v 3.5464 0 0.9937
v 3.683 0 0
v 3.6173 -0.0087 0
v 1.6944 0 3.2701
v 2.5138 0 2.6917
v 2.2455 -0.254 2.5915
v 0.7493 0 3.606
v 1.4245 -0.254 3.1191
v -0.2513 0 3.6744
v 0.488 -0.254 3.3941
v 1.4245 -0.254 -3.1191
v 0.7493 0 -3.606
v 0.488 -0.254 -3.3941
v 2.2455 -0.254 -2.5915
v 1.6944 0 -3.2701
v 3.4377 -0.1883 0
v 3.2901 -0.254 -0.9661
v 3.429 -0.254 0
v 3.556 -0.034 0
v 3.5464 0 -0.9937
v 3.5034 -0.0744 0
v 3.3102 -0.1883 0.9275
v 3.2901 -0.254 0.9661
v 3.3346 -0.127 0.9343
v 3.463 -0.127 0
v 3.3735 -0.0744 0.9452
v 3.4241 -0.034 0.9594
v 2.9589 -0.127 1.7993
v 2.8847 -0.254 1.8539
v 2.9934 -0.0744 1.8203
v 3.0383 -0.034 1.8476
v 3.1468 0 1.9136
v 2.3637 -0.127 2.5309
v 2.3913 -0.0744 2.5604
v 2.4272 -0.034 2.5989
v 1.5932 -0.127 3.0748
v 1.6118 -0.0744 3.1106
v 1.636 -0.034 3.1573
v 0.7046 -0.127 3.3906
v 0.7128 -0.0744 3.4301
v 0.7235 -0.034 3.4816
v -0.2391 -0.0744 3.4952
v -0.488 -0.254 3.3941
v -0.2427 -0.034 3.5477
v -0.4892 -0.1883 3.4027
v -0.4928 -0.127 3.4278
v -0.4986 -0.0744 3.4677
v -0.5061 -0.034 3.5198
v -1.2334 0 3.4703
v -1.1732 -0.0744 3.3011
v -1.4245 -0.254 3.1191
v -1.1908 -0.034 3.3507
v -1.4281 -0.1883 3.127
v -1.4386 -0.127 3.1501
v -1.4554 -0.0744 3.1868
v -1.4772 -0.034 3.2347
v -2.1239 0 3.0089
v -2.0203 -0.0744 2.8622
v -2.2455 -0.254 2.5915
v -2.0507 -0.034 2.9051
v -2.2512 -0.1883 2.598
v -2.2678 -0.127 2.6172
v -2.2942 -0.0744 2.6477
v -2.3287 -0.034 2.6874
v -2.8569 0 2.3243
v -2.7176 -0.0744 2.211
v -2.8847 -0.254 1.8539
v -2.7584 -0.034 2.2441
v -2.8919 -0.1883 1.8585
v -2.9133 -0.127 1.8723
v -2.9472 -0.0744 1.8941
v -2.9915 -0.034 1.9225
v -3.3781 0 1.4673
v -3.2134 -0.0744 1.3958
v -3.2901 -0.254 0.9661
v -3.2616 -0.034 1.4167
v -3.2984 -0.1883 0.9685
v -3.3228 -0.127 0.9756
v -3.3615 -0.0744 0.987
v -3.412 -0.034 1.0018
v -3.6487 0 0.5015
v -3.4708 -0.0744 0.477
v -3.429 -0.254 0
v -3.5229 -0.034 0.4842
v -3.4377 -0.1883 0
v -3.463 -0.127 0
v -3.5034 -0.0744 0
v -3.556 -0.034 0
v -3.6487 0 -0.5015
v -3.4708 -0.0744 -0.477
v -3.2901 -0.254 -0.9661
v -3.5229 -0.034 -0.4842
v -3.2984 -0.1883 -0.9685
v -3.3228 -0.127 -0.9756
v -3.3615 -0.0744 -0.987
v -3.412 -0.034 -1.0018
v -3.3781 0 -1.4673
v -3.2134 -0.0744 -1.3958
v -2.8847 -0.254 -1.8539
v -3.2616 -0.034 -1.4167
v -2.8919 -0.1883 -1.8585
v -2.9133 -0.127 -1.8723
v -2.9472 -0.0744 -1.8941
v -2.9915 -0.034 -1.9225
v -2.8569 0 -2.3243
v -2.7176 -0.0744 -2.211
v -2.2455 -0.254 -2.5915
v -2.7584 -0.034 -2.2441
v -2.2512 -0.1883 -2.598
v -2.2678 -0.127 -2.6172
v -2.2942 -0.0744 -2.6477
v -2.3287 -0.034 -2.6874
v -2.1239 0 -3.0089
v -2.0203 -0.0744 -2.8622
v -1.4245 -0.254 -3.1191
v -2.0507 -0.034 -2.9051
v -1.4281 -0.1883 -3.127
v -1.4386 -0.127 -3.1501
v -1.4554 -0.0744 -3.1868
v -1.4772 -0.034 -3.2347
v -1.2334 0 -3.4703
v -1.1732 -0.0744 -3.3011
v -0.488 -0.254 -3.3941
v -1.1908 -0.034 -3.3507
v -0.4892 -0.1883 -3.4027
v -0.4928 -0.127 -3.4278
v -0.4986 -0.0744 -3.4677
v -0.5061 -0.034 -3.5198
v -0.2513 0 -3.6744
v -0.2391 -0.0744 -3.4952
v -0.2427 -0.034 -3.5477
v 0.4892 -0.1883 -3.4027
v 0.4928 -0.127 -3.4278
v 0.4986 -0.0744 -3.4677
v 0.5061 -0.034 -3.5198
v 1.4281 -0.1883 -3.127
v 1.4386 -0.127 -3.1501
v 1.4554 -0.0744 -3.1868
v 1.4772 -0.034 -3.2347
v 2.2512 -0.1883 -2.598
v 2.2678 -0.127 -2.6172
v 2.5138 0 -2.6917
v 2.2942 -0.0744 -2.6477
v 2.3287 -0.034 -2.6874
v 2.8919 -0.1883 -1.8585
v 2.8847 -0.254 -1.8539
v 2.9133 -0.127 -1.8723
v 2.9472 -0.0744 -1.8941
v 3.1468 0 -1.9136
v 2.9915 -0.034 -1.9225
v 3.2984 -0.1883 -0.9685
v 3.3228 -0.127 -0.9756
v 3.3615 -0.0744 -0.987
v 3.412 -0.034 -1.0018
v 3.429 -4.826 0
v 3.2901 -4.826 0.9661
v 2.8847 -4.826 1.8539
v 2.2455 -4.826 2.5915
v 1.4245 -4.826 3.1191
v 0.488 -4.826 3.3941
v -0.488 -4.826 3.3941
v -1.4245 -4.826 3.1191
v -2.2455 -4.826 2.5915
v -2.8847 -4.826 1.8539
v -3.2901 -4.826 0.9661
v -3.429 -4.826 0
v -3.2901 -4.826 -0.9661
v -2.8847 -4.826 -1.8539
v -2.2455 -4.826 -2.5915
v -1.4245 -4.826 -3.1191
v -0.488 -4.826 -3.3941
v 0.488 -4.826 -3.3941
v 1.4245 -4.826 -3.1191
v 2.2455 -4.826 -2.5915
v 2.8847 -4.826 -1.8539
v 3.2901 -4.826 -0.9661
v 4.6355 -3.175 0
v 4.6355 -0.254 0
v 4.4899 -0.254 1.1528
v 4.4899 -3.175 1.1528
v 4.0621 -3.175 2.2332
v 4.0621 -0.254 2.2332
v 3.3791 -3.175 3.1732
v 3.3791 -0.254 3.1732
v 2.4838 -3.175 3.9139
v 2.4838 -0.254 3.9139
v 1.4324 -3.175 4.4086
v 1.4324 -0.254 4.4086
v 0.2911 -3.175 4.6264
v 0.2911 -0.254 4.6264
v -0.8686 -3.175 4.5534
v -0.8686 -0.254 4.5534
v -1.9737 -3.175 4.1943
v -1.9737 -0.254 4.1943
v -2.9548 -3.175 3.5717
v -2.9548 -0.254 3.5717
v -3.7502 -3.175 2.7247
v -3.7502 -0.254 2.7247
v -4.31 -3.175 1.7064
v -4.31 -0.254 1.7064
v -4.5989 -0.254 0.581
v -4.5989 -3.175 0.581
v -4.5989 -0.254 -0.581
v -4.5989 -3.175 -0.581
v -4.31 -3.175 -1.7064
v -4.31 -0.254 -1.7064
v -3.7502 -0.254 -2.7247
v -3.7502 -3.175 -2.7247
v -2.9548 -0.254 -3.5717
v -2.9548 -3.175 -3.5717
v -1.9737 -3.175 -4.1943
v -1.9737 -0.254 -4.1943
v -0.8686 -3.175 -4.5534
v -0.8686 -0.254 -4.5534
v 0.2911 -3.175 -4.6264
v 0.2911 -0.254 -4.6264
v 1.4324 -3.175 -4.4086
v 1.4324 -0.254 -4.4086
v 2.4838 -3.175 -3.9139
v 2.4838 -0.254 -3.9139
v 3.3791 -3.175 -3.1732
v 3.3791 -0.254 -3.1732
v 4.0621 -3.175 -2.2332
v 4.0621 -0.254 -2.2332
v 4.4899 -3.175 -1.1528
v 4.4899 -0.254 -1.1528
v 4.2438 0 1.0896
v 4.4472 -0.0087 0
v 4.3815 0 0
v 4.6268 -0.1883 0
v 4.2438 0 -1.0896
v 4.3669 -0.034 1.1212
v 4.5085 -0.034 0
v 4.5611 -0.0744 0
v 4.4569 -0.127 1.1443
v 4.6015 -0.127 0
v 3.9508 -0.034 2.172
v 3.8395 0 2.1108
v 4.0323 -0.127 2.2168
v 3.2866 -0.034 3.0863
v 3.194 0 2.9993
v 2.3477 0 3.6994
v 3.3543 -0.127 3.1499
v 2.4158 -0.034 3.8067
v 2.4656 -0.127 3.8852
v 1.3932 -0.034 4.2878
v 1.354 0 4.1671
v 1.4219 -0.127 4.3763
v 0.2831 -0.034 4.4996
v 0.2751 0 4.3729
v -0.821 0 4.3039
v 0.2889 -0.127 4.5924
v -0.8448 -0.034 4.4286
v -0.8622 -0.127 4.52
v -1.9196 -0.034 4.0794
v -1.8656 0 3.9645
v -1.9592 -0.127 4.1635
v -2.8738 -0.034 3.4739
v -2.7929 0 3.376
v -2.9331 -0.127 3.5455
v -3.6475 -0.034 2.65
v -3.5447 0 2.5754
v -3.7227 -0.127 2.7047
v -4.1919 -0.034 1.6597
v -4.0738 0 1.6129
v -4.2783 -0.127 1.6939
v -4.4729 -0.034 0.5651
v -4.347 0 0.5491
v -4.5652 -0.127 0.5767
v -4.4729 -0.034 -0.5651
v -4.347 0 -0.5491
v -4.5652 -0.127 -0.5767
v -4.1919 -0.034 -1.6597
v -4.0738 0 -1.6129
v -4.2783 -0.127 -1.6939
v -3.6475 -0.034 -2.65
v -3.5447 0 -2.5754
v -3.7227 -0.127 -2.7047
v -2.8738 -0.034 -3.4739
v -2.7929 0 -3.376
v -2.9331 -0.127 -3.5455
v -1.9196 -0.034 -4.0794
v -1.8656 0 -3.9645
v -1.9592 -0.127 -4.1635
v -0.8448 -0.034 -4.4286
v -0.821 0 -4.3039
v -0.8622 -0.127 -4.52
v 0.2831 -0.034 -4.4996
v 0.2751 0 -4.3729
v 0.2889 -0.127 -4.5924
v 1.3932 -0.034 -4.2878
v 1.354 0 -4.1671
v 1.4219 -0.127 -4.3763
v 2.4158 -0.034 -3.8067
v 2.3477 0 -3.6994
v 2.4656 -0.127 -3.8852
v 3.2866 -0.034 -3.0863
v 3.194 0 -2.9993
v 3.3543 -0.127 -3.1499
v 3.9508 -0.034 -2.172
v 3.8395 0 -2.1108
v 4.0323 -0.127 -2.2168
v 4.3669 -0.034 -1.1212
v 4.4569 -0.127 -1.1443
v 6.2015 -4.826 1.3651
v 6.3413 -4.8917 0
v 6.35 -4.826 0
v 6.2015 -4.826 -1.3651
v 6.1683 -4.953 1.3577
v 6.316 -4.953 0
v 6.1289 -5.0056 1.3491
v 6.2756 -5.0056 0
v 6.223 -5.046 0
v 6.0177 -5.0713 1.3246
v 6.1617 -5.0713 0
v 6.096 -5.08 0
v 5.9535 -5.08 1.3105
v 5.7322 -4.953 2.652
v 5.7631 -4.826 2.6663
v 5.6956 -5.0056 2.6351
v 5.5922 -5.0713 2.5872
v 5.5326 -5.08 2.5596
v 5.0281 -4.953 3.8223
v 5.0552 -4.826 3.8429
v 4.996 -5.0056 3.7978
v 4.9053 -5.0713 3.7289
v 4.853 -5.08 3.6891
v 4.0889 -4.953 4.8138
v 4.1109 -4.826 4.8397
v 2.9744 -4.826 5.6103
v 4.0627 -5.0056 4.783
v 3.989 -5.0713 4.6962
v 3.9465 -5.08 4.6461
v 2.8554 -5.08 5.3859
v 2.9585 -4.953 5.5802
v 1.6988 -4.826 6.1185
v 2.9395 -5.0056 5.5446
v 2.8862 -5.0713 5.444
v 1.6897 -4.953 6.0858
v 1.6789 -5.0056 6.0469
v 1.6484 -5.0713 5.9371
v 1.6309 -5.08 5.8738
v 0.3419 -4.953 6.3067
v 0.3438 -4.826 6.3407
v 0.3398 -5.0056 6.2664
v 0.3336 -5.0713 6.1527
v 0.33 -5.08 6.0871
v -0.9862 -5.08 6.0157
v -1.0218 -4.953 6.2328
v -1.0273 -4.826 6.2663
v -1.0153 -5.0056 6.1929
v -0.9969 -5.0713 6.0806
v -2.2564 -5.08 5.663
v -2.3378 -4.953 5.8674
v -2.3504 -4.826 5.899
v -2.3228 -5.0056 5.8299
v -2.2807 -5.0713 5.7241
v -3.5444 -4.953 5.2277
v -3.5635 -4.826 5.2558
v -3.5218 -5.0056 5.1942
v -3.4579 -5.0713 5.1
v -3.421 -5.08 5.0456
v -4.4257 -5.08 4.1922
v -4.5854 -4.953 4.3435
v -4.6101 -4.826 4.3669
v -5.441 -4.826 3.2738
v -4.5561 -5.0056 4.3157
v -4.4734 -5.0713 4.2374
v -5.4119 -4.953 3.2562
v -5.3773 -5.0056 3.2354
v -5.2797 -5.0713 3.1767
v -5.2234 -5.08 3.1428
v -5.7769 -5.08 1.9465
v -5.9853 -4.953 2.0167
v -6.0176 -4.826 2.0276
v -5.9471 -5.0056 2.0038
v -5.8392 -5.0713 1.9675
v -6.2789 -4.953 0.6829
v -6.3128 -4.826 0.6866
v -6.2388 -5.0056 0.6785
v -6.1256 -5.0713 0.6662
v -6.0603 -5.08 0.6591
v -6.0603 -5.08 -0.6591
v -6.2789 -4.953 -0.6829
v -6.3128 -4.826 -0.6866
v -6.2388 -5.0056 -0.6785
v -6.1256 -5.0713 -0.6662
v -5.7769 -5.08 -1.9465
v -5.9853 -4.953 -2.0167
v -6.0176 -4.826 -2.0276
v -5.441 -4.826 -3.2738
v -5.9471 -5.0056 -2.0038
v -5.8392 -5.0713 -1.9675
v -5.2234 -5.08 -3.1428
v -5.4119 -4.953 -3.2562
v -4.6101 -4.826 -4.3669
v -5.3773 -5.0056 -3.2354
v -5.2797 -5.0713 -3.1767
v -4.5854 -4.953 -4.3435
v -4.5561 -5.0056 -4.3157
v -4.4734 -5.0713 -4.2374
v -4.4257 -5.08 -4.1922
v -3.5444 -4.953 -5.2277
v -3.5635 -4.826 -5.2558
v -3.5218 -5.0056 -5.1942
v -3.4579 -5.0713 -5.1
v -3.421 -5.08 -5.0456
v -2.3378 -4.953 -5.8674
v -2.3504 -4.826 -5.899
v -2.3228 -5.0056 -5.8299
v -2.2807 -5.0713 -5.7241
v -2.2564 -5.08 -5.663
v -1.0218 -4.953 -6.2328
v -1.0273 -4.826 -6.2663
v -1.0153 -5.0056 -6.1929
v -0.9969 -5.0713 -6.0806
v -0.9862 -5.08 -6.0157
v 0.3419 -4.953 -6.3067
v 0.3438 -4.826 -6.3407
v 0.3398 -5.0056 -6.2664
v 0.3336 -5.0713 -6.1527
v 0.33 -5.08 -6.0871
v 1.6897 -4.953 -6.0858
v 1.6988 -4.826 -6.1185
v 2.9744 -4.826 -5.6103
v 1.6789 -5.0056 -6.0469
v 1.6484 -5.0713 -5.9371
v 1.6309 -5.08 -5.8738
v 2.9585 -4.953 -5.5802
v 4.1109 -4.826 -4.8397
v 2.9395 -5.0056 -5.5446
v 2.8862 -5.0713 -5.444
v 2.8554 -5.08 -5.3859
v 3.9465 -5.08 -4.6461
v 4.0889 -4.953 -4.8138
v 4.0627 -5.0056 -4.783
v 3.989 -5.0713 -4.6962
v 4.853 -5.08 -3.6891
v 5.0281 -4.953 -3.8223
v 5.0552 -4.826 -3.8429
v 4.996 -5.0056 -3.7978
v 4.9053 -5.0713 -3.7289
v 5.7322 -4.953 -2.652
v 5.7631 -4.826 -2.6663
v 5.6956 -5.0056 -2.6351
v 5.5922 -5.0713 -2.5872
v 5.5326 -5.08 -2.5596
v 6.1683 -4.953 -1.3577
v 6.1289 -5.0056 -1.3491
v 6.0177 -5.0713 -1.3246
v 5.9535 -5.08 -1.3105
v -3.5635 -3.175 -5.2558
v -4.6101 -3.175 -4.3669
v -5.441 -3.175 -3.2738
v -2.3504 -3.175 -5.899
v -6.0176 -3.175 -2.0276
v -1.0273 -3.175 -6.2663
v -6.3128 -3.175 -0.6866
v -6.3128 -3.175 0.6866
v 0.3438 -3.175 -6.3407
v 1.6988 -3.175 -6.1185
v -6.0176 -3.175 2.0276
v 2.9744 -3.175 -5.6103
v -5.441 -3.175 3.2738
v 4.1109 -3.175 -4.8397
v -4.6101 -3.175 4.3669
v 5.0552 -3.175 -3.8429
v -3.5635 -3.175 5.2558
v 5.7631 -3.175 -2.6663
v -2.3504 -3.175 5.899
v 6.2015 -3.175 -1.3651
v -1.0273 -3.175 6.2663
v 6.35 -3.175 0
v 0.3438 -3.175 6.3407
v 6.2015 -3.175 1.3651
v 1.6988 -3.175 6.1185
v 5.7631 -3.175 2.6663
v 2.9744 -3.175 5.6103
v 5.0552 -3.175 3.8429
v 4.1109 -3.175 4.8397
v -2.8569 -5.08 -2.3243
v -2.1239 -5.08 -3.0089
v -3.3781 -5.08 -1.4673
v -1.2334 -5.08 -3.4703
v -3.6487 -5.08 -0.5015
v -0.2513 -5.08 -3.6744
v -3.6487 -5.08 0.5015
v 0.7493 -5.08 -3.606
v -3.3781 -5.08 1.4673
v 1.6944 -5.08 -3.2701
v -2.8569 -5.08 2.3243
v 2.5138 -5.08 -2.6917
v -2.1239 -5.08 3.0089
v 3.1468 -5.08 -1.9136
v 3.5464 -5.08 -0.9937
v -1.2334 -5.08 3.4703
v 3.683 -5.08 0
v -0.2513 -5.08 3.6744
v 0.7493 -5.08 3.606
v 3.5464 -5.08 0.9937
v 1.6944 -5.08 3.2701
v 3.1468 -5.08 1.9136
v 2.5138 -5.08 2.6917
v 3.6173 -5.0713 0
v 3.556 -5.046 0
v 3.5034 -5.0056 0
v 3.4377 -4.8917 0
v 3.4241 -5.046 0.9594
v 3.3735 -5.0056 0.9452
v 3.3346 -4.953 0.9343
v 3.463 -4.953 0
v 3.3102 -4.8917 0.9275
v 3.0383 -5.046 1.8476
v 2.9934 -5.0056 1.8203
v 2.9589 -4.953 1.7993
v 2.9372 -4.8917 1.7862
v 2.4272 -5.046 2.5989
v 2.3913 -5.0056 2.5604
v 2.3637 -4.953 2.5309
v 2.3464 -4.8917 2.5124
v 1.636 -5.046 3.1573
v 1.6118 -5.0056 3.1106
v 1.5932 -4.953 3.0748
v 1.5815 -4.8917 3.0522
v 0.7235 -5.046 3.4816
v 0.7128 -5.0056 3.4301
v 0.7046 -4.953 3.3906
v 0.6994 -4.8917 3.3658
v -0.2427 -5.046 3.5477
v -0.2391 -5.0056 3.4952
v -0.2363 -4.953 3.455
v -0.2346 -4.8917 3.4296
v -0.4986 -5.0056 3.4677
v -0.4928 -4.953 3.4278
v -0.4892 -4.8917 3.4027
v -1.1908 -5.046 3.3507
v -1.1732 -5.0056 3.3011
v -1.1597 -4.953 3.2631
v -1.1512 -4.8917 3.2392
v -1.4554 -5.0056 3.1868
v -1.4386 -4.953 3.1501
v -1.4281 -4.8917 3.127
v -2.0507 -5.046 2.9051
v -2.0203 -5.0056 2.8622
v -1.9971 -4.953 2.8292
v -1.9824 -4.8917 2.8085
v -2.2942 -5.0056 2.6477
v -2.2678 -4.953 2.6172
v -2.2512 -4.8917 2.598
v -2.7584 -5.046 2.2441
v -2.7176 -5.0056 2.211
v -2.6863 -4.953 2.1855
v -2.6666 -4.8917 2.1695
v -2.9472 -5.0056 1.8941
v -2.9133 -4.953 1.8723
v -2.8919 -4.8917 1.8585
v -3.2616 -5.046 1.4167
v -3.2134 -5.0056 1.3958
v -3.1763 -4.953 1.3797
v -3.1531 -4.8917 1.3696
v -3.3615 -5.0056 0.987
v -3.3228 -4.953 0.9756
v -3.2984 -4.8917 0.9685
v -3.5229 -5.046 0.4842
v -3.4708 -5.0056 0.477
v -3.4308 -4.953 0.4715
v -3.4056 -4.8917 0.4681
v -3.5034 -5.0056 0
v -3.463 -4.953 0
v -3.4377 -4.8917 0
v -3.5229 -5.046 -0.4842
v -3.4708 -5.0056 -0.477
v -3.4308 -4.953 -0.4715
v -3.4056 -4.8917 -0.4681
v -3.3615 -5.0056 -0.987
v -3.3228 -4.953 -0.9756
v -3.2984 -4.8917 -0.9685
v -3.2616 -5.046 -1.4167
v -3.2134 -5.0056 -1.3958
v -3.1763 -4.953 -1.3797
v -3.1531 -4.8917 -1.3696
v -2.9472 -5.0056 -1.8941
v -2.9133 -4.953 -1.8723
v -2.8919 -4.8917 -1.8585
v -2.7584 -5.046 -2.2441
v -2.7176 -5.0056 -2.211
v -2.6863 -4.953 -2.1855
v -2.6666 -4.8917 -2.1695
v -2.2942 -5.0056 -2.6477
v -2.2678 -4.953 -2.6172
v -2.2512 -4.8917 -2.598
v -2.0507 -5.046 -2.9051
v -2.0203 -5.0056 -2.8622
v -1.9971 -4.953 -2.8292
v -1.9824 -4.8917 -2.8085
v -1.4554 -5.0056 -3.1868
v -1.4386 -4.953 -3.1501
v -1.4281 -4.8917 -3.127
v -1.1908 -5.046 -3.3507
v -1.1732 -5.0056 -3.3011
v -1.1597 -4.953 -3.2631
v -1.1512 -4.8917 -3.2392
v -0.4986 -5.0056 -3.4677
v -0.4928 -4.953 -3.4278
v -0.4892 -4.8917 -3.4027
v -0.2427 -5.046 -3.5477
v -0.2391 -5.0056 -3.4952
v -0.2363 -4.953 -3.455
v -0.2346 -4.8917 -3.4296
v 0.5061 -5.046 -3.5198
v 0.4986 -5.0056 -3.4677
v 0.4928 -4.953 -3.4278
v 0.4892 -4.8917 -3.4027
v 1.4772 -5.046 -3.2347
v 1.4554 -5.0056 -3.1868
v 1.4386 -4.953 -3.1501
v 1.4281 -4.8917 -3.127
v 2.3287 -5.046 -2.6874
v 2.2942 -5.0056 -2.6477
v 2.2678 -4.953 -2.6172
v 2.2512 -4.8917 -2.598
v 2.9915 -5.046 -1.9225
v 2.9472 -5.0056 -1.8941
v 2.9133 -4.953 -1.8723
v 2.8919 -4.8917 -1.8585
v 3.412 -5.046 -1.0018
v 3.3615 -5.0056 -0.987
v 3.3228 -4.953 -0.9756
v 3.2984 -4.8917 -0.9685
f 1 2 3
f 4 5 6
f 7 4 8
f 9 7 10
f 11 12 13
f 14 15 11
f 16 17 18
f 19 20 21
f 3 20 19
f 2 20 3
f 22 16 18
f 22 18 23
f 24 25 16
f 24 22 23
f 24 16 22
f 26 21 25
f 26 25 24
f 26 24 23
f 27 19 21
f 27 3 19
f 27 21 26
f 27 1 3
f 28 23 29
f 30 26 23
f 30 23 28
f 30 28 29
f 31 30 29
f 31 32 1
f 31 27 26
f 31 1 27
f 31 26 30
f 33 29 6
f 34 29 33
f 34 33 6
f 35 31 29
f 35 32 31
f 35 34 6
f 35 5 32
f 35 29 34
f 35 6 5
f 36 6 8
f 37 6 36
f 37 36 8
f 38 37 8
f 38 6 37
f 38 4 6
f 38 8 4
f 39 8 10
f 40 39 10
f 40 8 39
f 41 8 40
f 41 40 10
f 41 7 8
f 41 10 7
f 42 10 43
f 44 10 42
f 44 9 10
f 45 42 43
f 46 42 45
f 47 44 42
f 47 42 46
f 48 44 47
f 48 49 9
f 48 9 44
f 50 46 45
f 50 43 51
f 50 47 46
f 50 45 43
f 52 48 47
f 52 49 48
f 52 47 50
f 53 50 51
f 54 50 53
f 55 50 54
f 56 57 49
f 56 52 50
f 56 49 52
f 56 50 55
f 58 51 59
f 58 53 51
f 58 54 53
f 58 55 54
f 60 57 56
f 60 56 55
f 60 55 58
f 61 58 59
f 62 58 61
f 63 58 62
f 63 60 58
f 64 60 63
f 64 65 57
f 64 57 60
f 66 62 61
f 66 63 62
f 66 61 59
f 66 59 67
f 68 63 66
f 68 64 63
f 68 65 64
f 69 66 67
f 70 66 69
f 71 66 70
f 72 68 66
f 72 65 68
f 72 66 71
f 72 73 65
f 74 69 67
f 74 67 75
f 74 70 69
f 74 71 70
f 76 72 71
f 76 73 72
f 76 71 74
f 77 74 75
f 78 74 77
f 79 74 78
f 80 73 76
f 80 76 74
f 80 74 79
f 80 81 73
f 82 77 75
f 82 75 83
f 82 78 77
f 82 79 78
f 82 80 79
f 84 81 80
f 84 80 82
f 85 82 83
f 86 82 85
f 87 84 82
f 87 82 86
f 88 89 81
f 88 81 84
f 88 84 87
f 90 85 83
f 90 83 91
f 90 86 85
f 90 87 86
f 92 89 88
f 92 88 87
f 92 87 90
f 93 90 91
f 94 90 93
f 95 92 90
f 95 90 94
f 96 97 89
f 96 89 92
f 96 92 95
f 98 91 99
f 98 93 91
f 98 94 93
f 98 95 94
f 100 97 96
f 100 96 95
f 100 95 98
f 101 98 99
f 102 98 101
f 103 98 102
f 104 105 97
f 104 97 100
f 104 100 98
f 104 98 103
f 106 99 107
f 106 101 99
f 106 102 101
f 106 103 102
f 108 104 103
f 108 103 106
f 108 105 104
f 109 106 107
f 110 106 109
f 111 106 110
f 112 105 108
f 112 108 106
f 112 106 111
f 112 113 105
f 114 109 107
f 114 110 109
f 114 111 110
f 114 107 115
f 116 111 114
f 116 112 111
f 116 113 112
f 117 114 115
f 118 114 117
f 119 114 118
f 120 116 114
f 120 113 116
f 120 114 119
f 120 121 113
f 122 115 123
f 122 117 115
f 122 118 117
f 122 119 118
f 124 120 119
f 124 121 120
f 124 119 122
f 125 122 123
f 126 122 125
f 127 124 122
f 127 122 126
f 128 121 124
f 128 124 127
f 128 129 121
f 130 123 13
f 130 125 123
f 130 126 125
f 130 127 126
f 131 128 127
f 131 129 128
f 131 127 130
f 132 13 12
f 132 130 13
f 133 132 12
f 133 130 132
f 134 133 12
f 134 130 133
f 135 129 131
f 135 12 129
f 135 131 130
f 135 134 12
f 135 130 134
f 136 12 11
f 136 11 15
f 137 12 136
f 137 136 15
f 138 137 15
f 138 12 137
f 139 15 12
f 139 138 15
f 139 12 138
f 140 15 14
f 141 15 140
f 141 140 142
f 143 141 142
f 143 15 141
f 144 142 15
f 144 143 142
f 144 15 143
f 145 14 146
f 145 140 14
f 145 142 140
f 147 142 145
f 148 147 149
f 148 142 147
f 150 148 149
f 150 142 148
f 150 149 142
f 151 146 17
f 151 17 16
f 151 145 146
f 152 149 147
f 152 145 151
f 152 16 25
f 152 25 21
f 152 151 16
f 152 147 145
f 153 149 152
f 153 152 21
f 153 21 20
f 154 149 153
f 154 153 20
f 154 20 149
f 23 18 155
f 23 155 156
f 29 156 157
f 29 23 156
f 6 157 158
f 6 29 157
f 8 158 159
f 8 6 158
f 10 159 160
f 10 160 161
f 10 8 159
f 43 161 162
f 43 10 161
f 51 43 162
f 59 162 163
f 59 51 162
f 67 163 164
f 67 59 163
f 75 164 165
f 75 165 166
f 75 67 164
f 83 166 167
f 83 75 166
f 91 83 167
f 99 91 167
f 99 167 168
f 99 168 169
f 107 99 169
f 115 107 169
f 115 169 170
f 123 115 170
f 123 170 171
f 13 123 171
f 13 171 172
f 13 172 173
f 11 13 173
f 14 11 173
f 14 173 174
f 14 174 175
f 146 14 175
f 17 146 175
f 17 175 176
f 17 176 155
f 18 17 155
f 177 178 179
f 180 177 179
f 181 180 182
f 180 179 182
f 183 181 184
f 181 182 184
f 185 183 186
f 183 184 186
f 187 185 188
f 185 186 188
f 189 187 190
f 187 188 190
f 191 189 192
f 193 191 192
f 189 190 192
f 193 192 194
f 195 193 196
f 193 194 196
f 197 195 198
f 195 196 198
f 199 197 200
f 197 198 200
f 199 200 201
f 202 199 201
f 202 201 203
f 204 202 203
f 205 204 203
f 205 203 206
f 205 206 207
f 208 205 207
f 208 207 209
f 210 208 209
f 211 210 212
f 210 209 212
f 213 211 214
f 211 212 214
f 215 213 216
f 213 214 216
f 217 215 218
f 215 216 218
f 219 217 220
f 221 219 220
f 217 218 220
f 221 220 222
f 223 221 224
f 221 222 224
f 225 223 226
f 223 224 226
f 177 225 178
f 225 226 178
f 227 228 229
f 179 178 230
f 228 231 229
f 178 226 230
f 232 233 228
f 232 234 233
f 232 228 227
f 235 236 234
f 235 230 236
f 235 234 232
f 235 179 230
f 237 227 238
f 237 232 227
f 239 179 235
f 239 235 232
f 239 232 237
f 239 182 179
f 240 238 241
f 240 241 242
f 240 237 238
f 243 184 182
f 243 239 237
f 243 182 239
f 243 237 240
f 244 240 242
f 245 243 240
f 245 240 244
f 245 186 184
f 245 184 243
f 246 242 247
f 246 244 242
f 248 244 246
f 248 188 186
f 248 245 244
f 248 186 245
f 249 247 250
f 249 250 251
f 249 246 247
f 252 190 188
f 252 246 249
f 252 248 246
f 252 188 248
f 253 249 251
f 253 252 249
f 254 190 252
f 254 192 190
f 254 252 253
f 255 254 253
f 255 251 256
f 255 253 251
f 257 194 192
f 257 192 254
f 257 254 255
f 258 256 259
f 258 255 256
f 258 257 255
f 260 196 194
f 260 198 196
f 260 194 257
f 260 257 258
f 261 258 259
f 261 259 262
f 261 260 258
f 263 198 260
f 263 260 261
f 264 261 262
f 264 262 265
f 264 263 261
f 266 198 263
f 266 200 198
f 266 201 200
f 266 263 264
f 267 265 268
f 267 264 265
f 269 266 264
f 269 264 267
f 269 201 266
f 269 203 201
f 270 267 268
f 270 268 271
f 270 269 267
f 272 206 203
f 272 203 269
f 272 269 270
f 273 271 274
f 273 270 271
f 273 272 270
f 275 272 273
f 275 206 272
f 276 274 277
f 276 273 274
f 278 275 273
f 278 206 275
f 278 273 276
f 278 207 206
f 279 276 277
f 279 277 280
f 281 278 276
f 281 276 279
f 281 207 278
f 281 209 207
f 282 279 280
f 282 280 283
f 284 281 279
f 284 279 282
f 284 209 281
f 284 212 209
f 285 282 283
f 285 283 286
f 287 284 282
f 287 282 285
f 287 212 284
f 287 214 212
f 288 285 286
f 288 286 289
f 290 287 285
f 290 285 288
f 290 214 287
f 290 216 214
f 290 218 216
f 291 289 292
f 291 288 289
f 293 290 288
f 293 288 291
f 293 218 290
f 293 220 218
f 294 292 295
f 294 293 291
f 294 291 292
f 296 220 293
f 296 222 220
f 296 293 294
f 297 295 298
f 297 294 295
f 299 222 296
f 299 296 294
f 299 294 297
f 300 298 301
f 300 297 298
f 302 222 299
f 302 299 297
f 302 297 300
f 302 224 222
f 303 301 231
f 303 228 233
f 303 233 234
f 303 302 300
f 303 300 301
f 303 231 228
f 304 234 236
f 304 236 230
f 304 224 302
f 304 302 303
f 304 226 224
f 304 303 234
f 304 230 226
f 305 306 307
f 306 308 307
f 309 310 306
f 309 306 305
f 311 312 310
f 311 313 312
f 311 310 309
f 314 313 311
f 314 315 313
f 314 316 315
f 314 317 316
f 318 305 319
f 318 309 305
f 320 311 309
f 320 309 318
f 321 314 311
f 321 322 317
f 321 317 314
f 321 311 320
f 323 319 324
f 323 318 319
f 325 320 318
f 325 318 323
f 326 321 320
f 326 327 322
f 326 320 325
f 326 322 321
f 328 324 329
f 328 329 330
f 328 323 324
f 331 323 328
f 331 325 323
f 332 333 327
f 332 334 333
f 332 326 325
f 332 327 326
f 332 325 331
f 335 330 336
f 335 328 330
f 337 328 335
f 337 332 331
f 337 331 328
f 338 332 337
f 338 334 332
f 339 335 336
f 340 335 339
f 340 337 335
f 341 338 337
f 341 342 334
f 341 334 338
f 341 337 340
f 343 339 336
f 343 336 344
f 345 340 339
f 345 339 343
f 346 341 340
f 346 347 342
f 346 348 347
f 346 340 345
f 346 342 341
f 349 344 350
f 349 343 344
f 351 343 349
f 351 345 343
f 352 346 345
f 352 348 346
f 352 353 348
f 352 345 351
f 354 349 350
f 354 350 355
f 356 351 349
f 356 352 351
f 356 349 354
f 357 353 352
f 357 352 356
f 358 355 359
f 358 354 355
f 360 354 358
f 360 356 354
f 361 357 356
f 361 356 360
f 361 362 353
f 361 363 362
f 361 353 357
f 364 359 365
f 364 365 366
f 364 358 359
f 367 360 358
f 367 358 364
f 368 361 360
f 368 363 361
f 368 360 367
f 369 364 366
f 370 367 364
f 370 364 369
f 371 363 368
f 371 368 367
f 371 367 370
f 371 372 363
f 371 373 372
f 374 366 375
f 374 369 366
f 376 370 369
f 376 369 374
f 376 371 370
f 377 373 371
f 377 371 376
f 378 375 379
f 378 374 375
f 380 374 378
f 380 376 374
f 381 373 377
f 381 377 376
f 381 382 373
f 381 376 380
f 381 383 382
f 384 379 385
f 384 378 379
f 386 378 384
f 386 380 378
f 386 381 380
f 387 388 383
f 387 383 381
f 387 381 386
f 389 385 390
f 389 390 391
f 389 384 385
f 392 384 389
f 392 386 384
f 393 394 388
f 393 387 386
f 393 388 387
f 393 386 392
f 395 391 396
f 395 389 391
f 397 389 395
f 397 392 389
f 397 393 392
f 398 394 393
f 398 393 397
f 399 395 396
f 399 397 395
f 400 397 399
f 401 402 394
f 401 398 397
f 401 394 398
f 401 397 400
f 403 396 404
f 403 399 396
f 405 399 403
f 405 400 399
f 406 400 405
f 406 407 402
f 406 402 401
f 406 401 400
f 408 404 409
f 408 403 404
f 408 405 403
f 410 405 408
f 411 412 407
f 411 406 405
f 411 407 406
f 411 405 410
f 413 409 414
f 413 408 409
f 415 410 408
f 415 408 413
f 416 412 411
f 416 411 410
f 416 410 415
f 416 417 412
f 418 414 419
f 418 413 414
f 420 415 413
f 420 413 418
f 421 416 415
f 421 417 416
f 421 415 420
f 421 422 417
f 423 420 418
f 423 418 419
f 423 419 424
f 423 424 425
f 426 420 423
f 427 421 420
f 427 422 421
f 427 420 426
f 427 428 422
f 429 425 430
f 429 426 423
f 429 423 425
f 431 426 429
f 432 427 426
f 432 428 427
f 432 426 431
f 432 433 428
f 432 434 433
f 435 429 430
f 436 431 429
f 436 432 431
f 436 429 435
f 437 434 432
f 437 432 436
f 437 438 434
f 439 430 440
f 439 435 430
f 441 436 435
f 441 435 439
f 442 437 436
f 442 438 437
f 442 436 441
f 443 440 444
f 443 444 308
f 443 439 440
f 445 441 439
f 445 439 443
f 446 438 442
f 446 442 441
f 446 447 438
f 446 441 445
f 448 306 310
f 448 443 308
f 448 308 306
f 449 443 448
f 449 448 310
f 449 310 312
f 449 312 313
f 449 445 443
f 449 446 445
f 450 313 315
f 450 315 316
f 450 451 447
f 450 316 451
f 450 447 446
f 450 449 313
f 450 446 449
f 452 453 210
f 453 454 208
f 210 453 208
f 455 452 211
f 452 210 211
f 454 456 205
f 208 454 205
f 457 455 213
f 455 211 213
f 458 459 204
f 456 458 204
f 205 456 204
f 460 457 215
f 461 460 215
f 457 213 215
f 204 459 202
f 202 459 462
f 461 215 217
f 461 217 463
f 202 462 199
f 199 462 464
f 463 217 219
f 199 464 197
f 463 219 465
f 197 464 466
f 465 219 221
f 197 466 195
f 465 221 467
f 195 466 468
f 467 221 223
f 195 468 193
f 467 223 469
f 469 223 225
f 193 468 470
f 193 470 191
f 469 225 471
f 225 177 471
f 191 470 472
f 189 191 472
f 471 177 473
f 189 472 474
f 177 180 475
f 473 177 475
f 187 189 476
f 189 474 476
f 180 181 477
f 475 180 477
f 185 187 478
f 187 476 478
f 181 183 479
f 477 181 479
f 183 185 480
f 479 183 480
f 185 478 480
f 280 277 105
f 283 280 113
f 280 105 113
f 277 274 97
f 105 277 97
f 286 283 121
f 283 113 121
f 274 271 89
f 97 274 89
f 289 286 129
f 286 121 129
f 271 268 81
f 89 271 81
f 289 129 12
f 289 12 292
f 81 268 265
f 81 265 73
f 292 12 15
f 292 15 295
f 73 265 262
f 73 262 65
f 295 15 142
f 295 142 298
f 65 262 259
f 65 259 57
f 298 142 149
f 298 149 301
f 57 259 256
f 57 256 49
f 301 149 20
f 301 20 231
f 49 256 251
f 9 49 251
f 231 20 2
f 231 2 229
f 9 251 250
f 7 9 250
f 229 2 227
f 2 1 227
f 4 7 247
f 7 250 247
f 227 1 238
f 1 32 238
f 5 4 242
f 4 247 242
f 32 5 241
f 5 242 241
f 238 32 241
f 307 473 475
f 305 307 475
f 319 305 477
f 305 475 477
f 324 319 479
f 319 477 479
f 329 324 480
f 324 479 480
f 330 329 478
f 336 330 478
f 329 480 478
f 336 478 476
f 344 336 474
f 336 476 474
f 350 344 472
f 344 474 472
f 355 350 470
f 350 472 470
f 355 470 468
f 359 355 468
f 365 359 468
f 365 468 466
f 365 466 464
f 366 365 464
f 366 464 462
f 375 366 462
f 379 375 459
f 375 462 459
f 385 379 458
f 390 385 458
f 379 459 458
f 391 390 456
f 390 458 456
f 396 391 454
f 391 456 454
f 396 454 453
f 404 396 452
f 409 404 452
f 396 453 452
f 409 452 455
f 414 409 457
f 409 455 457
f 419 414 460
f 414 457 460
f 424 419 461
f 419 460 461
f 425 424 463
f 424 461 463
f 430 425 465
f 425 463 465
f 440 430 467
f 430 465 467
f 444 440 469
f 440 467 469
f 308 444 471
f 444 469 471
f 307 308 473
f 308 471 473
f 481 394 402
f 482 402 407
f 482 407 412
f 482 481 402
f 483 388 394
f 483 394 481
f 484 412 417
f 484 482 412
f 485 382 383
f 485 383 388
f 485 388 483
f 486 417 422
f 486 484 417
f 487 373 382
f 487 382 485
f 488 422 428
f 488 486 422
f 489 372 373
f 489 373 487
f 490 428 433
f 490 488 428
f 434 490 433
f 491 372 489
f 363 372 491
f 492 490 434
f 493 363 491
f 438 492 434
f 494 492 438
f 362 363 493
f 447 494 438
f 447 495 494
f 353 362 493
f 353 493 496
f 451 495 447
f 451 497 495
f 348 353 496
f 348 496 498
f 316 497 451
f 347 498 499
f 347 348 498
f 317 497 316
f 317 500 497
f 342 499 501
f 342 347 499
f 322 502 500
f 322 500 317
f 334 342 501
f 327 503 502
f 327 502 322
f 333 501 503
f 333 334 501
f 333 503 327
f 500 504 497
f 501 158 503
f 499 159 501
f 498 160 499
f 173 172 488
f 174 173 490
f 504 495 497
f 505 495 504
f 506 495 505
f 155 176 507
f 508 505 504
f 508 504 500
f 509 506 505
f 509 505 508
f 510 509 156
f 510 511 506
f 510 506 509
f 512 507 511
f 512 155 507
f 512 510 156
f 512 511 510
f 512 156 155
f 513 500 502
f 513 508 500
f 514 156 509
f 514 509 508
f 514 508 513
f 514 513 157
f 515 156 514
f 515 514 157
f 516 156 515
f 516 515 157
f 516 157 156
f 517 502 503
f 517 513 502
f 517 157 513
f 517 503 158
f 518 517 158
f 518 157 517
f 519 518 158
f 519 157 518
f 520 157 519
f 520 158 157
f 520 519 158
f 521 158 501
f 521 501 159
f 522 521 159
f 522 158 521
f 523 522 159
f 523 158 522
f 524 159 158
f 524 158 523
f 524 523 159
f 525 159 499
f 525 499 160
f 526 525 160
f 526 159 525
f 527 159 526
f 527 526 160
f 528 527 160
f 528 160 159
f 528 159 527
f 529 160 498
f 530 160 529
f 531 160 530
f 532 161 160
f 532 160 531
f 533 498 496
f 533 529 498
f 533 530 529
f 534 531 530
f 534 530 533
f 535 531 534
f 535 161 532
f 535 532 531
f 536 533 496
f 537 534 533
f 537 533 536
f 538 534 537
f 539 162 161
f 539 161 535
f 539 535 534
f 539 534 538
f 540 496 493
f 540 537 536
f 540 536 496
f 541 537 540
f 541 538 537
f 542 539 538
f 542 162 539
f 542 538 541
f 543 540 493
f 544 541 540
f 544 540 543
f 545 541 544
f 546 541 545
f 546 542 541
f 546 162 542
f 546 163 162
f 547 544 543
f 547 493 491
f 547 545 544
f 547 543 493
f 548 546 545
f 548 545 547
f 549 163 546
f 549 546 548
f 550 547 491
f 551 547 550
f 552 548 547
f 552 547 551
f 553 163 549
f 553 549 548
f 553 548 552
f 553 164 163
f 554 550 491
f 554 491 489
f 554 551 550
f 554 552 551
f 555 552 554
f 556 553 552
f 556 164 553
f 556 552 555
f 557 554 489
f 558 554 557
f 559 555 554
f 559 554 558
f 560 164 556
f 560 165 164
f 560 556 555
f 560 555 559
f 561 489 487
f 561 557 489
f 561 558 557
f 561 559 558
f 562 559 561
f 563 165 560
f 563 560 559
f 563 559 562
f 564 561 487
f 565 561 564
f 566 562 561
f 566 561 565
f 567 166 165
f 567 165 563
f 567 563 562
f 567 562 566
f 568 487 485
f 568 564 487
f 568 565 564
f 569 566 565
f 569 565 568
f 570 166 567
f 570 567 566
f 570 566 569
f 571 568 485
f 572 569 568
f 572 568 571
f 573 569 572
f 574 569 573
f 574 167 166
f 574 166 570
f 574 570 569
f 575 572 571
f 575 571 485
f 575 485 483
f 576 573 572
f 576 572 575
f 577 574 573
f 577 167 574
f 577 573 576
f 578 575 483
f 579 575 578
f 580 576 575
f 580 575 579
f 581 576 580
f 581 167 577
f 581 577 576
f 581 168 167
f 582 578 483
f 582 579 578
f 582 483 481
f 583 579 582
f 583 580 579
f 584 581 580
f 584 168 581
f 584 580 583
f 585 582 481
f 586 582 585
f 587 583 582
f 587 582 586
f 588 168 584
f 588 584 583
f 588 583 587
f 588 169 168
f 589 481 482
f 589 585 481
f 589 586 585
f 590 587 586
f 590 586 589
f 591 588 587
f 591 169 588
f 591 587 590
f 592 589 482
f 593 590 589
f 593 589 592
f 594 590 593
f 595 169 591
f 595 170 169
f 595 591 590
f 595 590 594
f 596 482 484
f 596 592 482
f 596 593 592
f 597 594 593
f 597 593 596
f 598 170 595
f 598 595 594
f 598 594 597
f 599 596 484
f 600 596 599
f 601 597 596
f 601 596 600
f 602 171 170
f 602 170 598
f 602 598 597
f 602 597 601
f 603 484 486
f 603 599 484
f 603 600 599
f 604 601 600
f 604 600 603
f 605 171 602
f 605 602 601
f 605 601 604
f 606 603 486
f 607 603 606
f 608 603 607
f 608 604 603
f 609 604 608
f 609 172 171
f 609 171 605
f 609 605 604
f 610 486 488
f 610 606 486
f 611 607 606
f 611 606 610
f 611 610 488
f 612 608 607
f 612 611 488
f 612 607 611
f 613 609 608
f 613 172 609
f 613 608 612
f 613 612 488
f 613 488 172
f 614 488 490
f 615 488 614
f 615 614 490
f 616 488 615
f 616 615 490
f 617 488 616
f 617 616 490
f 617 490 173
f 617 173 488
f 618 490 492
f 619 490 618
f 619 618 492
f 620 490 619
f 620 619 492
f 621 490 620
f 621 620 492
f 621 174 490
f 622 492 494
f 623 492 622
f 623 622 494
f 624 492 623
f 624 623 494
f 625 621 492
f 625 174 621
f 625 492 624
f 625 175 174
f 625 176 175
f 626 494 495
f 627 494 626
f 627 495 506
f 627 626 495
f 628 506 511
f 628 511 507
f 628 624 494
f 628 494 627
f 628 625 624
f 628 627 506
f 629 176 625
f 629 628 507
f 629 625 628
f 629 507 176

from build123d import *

# Parameters (mm, degrees)
F0_R     = 4.6355
F0_R_2   = 3.429
F1_DEPTH = 3.175
F2_R     = 6.35
F2_R_2   = 4.6355
F2_R_3   = 3.429
F3_DEPTH = 1.905
F4_R     = 0.254


with BuildPart() as f1:
    # F0 (on Front) → F1 (new body)
    with BuildSketch(Plane.XZ):
        Circle(F0_R)
        Circle(F0_R_2, mode=Mode.SUBTRACT)
    extrude(amount=F1_DEPTH)

    # F2 (on face) → F3 (join)
    with BuildSketch(Plane.XZ.offset(3.175)):
        Circle(F2_R)
        Circle(F2_R_2, mode=Mode.SUBTRACT)
        Circle(F2_R_2)
        Circle(F2_R_3, mode=Mode.SUBTRACT)
    extrude(amount=F3_DEPTH)

    # F4
    f4_edges = [f1.edges().sort_by_distance(p)[0] for p in [
        (-6.35, -5.08, 0),
        (-3.429, -5.08, 0),
        (-4.6355, 0, 0),
        (-3.429, 0, 0),
    ]]
    fillet(f4_edges, radius=F4_R)


solid = f1.part
